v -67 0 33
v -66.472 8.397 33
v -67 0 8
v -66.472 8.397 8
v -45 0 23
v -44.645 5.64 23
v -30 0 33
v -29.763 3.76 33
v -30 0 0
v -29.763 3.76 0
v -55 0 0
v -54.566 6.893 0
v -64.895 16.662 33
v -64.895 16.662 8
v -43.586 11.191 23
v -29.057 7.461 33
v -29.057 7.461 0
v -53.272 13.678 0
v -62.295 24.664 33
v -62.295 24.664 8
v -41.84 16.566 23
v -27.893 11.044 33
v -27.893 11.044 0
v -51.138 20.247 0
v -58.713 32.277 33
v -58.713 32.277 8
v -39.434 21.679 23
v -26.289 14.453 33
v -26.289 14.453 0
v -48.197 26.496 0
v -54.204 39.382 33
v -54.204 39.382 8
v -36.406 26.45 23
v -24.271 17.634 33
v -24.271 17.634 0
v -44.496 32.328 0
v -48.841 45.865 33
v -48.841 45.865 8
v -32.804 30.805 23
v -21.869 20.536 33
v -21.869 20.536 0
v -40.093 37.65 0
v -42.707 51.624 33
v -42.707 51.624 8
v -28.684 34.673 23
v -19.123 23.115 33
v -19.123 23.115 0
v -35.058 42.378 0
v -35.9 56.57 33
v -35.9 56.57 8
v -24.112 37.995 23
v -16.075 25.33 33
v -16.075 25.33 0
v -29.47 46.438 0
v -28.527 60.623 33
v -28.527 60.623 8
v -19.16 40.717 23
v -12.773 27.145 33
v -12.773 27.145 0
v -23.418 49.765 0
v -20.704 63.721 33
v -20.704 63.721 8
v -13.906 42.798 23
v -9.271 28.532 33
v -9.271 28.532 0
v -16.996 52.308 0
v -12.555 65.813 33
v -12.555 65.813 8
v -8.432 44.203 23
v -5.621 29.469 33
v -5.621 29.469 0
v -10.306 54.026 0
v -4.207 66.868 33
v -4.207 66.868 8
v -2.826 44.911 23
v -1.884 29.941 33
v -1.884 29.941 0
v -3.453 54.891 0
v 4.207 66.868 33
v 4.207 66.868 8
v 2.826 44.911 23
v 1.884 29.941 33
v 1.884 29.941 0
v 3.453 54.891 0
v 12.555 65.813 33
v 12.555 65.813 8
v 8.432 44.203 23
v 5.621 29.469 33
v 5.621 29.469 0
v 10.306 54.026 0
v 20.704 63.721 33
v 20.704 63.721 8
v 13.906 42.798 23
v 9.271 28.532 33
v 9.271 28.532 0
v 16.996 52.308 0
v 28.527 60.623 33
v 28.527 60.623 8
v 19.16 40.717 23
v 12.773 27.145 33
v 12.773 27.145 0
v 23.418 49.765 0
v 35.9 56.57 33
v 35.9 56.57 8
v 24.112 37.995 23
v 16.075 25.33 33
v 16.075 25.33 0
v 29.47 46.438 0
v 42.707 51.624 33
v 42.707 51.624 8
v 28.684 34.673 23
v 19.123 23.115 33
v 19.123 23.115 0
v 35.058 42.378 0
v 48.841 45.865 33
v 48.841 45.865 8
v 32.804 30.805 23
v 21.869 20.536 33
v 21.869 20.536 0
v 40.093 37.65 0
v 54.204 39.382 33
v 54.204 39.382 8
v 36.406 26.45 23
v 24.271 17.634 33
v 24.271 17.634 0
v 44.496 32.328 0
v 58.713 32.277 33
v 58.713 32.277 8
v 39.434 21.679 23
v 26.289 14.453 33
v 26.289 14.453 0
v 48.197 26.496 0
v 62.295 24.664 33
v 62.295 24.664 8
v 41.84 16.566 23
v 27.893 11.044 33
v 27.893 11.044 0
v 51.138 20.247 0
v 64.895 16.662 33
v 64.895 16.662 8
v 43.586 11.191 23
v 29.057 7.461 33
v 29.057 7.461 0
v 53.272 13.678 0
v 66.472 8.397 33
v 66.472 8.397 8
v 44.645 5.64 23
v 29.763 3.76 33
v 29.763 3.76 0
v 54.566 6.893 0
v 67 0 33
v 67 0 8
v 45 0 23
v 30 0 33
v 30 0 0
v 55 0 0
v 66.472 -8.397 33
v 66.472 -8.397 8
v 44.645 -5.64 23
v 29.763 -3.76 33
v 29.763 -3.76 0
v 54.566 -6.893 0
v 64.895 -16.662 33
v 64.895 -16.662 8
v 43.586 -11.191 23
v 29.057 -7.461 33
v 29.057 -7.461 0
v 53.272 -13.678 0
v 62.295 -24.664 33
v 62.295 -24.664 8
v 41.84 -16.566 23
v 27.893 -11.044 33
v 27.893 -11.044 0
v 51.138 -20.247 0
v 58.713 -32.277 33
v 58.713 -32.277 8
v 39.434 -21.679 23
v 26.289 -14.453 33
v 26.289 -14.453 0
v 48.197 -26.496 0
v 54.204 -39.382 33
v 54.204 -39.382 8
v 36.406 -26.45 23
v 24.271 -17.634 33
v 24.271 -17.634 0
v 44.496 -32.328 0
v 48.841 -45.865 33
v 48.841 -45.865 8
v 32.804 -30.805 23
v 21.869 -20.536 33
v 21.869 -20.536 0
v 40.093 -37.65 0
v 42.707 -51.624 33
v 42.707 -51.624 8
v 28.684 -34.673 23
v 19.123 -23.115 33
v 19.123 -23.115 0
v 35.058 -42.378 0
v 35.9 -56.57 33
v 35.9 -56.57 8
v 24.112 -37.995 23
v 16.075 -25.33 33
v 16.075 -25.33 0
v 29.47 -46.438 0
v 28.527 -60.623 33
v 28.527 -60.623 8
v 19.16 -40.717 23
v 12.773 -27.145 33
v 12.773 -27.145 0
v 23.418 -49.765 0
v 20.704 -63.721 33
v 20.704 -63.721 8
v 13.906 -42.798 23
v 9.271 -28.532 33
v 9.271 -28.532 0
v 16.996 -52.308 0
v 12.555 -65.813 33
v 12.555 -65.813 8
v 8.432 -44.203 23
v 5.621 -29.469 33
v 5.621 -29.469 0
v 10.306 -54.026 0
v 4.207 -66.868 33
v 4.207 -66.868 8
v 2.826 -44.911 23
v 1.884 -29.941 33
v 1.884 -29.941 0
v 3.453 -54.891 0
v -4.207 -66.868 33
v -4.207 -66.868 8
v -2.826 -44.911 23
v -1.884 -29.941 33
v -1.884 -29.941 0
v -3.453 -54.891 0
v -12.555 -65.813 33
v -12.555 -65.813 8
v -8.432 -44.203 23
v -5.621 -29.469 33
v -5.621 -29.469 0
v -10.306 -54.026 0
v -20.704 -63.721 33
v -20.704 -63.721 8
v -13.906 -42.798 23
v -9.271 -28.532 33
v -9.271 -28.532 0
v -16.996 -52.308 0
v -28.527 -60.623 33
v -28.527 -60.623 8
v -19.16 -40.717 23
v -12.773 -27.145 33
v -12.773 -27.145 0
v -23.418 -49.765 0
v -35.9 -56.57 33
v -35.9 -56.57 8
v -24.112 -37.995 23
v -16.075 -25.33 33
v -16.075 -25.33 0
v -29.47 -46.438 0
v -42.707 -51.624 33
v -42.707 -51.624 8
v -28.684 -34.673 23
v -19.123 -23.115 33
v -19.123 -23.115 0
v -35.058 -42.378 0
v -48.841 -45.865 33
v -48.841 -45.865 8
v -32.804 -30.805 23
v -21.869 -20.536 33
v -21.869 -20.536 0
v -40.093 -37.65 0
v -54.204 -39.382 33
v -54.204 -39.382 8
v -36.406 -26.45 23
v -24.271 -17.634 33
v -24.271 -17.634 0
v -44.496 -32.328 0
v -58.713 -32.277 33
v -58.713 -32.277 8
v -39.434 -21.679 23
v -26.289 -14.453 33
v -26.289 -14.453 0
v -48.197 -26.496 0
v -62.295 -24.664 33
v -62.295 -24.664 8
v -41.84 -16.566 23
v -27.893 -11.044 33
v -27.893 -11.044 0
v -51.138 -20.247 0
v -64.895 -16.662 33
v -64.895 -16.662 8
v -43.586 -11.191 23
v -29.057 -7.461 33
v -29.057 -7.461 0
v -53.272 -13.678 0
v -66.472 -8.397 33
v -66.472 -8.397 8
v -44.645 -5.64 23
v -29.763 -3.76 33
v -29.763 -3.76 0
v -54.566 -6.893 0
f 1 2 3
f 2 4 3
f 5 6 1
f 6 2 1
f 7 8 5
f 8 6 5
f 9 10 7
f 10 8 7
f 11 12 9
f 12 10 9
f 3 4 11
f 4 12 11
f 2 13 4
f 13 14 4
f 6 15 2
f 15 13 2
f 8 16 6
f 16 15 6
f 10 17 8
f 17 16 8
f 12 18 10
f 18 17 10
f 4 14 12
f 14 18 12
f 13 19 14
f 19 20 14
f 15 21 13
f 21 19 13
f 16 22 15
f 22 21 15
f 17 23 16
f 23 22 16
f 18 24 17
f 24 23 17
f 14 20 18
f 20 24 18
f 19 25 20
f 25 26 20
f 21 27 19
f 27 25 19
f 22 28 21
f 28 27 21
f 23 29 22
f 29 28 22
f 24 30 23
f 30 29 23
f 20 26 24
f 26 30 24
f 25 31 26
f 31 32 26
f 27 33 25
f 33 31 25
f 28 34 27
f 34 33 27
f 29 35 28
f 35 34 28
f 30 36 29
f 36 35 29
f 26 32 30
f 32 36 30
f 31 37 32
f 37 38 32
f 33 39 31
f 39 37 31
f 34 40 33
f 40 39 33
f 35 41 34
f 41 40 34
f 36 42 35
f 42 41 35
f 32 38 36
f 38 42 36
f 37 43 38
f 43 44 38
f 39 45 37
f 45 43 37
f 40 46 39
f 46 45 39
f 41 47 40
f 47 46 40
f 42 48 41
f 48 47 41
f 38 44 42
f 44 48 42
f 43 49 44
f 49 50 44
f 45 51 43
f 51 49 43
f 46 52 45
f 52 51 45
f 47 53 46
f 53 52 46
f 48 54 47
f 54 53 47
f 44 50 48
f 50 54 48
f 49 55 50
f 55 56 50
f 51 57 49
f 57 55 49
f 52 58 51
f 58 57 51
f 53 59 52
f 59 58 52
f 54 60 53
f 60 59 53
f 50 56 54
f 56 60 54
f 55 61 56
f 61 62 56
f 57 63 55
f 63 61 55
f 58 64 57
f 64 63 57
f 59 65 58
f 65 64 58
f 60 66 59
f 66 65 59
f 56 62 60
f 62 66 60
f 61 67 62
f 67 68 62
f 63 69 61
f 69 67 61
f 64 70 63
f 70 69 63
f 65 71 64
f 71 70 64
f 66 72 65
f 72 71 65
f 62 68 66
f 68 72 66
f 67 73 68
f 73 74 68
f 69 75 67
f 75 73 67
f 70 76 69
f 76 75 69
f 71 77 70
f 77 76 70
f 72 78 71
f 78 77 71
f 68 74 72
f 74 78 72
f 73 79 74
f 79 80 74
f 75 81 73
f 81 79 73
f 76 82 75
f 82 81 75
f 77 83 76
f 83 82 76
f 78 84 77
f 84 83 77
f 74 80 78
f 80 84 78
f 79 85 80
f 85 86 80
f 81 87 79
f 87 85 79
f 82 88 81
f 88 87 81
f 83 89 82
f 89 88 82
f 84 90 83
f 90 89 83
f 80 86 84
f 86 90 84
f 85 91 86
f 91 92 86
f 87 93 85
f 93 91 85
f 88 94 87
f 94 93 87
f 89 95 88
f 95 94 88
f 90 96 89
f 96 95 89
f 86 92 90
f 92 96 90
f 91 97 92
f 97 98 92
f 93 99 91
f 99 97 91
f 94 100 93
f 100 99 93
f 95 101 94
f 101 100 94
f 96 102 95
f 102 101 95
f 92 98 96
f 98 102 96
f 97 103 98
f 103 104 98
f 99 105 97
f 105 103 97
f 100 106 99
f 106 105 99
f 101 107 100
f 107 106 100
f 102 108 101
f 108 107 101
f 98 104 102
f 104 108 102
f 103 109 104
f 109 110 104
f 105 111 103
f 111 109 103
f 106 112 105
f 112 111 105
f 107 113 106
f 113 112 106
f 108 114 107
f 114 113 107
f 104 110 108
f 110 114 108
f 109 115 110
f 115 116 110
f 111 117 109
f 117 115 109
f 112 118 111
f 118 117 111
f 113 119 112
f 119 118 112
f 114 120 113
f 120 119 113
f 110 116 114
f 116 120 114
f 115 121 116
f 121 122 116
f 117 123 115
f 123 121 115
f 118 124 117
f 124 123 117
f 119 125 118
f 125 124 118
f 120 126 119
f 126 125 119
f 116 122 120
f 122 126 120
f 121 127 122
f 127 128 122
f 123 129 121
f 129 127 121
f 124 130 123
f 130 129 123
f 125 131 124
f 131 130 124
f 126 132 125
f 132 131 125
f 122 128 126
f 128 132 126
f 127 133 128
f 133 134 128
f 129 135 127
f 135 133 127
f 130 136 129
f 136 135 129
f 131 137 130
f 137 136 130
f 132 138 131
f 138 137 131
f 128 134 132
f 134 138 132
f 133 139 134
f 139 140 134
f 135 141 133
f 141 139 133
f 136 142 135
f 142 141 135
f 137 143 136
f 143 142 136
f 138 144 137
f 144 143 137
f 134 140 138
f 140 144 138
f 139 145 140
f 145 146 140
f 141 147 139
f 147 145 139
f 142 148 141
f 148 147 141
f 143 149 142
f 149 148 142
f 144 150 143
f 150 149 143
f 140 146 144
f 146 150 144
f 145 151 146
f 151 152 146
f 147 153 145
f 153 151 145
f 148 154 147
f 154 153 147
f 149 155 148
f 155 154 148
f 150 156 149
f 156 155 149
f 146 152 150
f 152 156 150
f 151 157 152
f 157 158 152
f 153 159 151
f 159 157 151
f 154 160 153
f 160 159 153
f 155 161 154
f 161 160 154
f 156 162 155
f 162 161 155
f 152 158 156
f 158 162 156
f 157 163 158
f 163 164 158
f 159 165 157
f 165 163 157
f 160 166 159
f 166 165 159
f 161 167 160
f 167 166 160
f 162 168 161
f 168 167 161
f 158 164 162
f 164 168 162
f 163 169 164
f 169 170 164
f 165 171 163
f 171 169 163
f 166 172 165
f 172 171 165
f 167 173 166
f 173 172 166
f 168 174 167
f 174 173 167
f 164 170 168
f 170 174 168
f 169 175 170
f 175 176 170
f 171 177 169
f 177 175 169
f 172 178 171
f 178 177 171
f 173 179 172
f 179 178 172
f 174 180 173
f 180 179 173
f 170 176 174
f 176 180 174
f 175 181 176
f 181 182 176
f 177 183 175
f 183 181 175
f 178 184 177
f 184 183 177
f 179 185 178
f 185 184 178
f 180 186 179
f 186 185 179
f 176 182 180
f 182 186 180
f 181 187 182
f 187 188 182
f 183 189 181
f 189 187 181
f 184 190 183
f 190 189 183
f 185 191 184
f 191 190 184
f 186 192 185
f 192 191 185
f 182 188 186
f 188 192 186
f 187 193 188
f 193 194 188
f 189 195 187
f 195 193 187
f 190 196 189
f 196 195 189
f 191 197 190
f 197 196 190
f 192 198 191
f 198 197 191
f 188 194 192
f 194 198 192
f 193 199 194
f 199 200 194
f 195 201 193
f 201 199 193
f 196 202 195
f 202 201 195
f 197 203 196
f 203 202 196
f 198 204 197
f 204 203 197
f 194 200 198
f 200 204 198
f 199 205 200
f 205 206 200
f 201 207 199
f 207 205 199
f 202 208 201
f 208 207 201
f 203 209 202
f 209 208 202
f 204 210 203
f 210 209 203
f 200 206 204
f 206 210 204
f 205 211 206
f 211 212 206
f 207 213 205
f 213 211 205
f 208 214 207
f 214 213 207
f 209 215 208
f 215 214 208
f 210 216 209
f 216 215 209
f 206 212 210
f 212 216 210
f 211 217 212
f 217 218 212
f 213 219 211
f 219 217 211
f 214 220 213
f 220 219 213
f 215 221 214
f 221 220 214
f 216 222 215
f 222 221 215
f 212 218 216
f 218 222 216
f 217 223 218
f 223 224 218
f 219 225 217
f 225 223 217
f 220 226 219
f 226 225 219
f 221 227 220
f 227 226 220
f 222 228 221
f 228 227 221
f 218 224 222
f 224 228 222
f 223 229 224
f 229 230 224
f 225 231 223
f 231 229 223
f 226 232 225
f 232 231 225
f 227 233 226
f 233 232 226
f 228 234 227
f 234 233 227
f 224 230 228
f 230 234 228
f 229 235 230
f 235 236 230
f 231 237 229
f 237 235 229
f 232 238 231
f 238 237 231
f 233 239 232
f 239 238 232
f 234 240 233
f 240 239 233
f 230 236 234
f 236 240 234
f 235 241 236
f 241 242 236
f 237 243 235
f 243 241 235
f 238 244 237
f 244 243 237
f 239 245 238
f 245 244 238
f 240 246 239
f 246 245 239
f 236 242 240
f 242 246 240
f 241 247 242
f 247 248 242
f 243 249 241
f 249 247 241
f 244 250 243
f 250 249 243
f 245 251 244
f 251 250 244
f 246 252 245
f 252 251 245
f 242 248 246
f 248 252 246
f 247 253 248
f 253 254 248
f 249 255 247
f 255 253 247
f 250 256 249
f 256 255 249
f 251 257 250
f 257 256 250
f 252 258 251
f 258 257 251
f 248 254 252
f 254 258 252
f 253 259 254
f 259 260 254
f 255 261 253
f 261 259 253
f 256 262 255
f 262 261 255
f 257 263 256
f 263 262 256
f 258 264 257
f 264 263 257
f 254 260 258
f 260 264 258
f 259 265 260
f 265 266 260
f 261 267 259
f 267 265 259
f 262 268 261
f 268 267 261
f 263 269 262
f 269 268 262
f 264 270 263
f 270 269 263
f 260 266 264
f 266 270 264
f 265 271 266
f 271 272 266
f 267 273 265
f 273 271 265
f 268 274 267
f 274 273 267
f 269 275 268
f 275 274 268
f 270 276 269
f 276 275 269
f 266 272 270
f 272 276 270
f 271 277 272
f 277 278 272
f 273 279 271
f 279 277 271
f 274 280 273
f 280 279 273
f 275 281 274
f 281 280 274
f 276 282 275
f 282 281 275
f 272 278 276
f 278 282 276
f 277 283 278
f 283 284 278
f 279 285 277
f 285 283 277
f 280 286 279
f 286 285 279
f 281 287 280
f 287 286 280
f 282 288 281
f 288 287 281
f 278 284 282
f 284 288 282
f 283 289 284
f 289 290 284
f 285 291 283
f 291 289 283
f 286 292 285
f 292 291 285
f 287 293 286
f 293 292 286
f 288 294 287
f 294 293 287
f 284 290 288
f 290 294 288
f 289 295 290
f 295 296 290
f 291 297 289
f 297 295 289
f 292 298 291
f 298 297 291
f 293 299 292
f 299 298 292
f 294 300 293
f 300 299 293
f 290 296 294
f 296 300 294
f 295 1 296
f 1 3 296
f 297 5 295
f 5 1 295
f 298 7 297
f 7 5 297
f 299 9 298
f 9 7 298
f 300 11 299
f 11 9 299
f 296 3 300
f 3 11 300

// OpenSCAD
/*
rotate_extrude

Rotational extrusion spins a 2D shape around the Z-axis to form a solid which has rotational symmetry. One way to think of this operation is to imagine a Potter's wheel placed on the X-Y plane with its axis of rotation pointing up towards +Z. Then place the to-be-made object on this virtual Potter's wheel (possibly extending down below the X-Y plane towards -Z). The to-be-made object is the cross-section of the object on the X-Y plane (keeping only the right half, X >= 0). That is the 2D shape that will be fed to rotate_extrude() as the child in order to generate this solid. Note that the object started on the X-Y plane but is tilted up (rotated +90 degrees about the X-axis) to extrude.

Since a 2D shape is rendered by OpenSCAD on the X-Y plane, an alternative way to think of this operation is as follows: spins a 2D shape around the Y-axis to form a solid. The resultant solid is placed so that its axis of rotation lies along the Z-axis.

Just like the linear_extrude, the extrusion is always performed on the projection of the 2D polygon to the XY plane. Transformations like rotate, translate, etc. applied to the 2D polygon before extrusion modify the projection of the 2D polygon to the XY plane and therefore also modify the appearance of the final 3D object.

    A translation in Z of the 2D polygon has no effect on the result (as also the projection is not affected).
    A translation in X increases the diameter of the final object.
    A translation in Y results in a shift of the final object in Z direction.
    A rotation about the X or Y axis distorts the cross section of the final object, as also the projection to the XY plane is distorted.

Don't get confused, as OpenSCAD displays 2D polygons with a certain height in the Z direction, so the 2D object (with its height) appears to have a bigger projection to the XY plane. But for the projection to the XY plane and also for the later extrusion only the base polygon without height is used.

You cannot use rotate_extrude to produce a helix or screw thread. Doing this properly can be difficult, so it's best to find a thread library to make them for you.

The 2D shape must lie completely on either the right (recommended) or the left side of the Y-axis. More precisely speaking, every vertex of the shape must have either x >= 0 or x <= 0. If the shape spans the X axis a warning appears in the console windows and the rotate_extrude() is ignored. If the 2D shape touches the Y axis, i.e. at x=0, it must be a line that touches, not a point, as a point results in a zero thickness 3D object, which is invalid and results in a CGAL error. For OpenSCAD versions prior to 2016.xxxx, if the shape is in the negative axis the resulting faces are oriented inside-out, which may cause undesired effects.
Usage

rotate_extrude(angle = 360, start=0, convexity = 2) {...}

Right-hand grip rule

In 2021.01 and previous, you must use parameter names due to a backward compatibility issue.

    convexity : If the extrusion fails for a non-trival 2D shape, try setting the convexity parameter (the default is not 10, but 10 is a "good" value to try).  The convexity parameter specifies the maximum number of front sides (or back sides) a ray intersecting the object might penetrate. This parameter is only needed for correctly displaying the object in OpenCSG preview mode when using the standard Goldfeather algorithm and has no effect on the polyhedron rendering (the mesh generation).


The convexity of a primitive is the maximum number of front (or back) faces of the primitive at a single position. For example, the convexity of a sphere is one and the convexity of a torus is two. 
    
    angle [Note: Requires version 2019.05] : Defaults to 360. Specifies the number of degrees to sweep, starting at the positive X axis. The direction of the sweep follows the Right Hand Rule, hence a negative angle sweeps clockwise.
    start [Note: Requires version Development snapshot] : Defaults to 0 if angle is specified, and 180 if not. Specifies the starting angle of the extrusion, counter-clockwise from the positive X axis.
    $fa : minimum angle (in degrees) of each fragment.
    $fs : minimum circumferential length of each fragment.
    $fn : fixed number of fragments in 360 degrees. Values of 3 or more override $fa and $fs

        $fa, $fs and $fn must be named parameters. click here for more details,.
        
        

*/
// Polygon - based extrusion
$fa = 1;
$fs = 0.4;
$fn = 50;

// \var height 1 y distance
h1 = 23;
// \var height 2 y distance
h2 = 10;
// \var height 3 y distance
h3 = 8;
// \var distances from origin
// first segment start x distance
d1 = 25; 
// second segment x distance
d2 = 12;
// final segment x distance 
d3 = 15;


// Points
p0 = [0, 0];
p1 = [0, h1 + h2];
p2 = [d3, h1];
p3 = [d1 + d2, h1 + h2];
p4 = [d1 + d2, h3];
p5 = [d1, 0];



// The rotated polygon profile

points = [p0, p1, p2, p3, p4, p5];

// DEBUG 
echo("polygon points : ", p0, p1, p2, p3, p4, p5 );
// demo the 2D object here
color("cyan")translate([0, 150, 0])rotate([ 90, 0, 90])polygon(points);
// DEBUG
// extend from x-y axis origin by x, y, z
hub_radius = 30;
rotate_extrude(angle=360)translate([hub_radius,0,0])
    polygon(points);
